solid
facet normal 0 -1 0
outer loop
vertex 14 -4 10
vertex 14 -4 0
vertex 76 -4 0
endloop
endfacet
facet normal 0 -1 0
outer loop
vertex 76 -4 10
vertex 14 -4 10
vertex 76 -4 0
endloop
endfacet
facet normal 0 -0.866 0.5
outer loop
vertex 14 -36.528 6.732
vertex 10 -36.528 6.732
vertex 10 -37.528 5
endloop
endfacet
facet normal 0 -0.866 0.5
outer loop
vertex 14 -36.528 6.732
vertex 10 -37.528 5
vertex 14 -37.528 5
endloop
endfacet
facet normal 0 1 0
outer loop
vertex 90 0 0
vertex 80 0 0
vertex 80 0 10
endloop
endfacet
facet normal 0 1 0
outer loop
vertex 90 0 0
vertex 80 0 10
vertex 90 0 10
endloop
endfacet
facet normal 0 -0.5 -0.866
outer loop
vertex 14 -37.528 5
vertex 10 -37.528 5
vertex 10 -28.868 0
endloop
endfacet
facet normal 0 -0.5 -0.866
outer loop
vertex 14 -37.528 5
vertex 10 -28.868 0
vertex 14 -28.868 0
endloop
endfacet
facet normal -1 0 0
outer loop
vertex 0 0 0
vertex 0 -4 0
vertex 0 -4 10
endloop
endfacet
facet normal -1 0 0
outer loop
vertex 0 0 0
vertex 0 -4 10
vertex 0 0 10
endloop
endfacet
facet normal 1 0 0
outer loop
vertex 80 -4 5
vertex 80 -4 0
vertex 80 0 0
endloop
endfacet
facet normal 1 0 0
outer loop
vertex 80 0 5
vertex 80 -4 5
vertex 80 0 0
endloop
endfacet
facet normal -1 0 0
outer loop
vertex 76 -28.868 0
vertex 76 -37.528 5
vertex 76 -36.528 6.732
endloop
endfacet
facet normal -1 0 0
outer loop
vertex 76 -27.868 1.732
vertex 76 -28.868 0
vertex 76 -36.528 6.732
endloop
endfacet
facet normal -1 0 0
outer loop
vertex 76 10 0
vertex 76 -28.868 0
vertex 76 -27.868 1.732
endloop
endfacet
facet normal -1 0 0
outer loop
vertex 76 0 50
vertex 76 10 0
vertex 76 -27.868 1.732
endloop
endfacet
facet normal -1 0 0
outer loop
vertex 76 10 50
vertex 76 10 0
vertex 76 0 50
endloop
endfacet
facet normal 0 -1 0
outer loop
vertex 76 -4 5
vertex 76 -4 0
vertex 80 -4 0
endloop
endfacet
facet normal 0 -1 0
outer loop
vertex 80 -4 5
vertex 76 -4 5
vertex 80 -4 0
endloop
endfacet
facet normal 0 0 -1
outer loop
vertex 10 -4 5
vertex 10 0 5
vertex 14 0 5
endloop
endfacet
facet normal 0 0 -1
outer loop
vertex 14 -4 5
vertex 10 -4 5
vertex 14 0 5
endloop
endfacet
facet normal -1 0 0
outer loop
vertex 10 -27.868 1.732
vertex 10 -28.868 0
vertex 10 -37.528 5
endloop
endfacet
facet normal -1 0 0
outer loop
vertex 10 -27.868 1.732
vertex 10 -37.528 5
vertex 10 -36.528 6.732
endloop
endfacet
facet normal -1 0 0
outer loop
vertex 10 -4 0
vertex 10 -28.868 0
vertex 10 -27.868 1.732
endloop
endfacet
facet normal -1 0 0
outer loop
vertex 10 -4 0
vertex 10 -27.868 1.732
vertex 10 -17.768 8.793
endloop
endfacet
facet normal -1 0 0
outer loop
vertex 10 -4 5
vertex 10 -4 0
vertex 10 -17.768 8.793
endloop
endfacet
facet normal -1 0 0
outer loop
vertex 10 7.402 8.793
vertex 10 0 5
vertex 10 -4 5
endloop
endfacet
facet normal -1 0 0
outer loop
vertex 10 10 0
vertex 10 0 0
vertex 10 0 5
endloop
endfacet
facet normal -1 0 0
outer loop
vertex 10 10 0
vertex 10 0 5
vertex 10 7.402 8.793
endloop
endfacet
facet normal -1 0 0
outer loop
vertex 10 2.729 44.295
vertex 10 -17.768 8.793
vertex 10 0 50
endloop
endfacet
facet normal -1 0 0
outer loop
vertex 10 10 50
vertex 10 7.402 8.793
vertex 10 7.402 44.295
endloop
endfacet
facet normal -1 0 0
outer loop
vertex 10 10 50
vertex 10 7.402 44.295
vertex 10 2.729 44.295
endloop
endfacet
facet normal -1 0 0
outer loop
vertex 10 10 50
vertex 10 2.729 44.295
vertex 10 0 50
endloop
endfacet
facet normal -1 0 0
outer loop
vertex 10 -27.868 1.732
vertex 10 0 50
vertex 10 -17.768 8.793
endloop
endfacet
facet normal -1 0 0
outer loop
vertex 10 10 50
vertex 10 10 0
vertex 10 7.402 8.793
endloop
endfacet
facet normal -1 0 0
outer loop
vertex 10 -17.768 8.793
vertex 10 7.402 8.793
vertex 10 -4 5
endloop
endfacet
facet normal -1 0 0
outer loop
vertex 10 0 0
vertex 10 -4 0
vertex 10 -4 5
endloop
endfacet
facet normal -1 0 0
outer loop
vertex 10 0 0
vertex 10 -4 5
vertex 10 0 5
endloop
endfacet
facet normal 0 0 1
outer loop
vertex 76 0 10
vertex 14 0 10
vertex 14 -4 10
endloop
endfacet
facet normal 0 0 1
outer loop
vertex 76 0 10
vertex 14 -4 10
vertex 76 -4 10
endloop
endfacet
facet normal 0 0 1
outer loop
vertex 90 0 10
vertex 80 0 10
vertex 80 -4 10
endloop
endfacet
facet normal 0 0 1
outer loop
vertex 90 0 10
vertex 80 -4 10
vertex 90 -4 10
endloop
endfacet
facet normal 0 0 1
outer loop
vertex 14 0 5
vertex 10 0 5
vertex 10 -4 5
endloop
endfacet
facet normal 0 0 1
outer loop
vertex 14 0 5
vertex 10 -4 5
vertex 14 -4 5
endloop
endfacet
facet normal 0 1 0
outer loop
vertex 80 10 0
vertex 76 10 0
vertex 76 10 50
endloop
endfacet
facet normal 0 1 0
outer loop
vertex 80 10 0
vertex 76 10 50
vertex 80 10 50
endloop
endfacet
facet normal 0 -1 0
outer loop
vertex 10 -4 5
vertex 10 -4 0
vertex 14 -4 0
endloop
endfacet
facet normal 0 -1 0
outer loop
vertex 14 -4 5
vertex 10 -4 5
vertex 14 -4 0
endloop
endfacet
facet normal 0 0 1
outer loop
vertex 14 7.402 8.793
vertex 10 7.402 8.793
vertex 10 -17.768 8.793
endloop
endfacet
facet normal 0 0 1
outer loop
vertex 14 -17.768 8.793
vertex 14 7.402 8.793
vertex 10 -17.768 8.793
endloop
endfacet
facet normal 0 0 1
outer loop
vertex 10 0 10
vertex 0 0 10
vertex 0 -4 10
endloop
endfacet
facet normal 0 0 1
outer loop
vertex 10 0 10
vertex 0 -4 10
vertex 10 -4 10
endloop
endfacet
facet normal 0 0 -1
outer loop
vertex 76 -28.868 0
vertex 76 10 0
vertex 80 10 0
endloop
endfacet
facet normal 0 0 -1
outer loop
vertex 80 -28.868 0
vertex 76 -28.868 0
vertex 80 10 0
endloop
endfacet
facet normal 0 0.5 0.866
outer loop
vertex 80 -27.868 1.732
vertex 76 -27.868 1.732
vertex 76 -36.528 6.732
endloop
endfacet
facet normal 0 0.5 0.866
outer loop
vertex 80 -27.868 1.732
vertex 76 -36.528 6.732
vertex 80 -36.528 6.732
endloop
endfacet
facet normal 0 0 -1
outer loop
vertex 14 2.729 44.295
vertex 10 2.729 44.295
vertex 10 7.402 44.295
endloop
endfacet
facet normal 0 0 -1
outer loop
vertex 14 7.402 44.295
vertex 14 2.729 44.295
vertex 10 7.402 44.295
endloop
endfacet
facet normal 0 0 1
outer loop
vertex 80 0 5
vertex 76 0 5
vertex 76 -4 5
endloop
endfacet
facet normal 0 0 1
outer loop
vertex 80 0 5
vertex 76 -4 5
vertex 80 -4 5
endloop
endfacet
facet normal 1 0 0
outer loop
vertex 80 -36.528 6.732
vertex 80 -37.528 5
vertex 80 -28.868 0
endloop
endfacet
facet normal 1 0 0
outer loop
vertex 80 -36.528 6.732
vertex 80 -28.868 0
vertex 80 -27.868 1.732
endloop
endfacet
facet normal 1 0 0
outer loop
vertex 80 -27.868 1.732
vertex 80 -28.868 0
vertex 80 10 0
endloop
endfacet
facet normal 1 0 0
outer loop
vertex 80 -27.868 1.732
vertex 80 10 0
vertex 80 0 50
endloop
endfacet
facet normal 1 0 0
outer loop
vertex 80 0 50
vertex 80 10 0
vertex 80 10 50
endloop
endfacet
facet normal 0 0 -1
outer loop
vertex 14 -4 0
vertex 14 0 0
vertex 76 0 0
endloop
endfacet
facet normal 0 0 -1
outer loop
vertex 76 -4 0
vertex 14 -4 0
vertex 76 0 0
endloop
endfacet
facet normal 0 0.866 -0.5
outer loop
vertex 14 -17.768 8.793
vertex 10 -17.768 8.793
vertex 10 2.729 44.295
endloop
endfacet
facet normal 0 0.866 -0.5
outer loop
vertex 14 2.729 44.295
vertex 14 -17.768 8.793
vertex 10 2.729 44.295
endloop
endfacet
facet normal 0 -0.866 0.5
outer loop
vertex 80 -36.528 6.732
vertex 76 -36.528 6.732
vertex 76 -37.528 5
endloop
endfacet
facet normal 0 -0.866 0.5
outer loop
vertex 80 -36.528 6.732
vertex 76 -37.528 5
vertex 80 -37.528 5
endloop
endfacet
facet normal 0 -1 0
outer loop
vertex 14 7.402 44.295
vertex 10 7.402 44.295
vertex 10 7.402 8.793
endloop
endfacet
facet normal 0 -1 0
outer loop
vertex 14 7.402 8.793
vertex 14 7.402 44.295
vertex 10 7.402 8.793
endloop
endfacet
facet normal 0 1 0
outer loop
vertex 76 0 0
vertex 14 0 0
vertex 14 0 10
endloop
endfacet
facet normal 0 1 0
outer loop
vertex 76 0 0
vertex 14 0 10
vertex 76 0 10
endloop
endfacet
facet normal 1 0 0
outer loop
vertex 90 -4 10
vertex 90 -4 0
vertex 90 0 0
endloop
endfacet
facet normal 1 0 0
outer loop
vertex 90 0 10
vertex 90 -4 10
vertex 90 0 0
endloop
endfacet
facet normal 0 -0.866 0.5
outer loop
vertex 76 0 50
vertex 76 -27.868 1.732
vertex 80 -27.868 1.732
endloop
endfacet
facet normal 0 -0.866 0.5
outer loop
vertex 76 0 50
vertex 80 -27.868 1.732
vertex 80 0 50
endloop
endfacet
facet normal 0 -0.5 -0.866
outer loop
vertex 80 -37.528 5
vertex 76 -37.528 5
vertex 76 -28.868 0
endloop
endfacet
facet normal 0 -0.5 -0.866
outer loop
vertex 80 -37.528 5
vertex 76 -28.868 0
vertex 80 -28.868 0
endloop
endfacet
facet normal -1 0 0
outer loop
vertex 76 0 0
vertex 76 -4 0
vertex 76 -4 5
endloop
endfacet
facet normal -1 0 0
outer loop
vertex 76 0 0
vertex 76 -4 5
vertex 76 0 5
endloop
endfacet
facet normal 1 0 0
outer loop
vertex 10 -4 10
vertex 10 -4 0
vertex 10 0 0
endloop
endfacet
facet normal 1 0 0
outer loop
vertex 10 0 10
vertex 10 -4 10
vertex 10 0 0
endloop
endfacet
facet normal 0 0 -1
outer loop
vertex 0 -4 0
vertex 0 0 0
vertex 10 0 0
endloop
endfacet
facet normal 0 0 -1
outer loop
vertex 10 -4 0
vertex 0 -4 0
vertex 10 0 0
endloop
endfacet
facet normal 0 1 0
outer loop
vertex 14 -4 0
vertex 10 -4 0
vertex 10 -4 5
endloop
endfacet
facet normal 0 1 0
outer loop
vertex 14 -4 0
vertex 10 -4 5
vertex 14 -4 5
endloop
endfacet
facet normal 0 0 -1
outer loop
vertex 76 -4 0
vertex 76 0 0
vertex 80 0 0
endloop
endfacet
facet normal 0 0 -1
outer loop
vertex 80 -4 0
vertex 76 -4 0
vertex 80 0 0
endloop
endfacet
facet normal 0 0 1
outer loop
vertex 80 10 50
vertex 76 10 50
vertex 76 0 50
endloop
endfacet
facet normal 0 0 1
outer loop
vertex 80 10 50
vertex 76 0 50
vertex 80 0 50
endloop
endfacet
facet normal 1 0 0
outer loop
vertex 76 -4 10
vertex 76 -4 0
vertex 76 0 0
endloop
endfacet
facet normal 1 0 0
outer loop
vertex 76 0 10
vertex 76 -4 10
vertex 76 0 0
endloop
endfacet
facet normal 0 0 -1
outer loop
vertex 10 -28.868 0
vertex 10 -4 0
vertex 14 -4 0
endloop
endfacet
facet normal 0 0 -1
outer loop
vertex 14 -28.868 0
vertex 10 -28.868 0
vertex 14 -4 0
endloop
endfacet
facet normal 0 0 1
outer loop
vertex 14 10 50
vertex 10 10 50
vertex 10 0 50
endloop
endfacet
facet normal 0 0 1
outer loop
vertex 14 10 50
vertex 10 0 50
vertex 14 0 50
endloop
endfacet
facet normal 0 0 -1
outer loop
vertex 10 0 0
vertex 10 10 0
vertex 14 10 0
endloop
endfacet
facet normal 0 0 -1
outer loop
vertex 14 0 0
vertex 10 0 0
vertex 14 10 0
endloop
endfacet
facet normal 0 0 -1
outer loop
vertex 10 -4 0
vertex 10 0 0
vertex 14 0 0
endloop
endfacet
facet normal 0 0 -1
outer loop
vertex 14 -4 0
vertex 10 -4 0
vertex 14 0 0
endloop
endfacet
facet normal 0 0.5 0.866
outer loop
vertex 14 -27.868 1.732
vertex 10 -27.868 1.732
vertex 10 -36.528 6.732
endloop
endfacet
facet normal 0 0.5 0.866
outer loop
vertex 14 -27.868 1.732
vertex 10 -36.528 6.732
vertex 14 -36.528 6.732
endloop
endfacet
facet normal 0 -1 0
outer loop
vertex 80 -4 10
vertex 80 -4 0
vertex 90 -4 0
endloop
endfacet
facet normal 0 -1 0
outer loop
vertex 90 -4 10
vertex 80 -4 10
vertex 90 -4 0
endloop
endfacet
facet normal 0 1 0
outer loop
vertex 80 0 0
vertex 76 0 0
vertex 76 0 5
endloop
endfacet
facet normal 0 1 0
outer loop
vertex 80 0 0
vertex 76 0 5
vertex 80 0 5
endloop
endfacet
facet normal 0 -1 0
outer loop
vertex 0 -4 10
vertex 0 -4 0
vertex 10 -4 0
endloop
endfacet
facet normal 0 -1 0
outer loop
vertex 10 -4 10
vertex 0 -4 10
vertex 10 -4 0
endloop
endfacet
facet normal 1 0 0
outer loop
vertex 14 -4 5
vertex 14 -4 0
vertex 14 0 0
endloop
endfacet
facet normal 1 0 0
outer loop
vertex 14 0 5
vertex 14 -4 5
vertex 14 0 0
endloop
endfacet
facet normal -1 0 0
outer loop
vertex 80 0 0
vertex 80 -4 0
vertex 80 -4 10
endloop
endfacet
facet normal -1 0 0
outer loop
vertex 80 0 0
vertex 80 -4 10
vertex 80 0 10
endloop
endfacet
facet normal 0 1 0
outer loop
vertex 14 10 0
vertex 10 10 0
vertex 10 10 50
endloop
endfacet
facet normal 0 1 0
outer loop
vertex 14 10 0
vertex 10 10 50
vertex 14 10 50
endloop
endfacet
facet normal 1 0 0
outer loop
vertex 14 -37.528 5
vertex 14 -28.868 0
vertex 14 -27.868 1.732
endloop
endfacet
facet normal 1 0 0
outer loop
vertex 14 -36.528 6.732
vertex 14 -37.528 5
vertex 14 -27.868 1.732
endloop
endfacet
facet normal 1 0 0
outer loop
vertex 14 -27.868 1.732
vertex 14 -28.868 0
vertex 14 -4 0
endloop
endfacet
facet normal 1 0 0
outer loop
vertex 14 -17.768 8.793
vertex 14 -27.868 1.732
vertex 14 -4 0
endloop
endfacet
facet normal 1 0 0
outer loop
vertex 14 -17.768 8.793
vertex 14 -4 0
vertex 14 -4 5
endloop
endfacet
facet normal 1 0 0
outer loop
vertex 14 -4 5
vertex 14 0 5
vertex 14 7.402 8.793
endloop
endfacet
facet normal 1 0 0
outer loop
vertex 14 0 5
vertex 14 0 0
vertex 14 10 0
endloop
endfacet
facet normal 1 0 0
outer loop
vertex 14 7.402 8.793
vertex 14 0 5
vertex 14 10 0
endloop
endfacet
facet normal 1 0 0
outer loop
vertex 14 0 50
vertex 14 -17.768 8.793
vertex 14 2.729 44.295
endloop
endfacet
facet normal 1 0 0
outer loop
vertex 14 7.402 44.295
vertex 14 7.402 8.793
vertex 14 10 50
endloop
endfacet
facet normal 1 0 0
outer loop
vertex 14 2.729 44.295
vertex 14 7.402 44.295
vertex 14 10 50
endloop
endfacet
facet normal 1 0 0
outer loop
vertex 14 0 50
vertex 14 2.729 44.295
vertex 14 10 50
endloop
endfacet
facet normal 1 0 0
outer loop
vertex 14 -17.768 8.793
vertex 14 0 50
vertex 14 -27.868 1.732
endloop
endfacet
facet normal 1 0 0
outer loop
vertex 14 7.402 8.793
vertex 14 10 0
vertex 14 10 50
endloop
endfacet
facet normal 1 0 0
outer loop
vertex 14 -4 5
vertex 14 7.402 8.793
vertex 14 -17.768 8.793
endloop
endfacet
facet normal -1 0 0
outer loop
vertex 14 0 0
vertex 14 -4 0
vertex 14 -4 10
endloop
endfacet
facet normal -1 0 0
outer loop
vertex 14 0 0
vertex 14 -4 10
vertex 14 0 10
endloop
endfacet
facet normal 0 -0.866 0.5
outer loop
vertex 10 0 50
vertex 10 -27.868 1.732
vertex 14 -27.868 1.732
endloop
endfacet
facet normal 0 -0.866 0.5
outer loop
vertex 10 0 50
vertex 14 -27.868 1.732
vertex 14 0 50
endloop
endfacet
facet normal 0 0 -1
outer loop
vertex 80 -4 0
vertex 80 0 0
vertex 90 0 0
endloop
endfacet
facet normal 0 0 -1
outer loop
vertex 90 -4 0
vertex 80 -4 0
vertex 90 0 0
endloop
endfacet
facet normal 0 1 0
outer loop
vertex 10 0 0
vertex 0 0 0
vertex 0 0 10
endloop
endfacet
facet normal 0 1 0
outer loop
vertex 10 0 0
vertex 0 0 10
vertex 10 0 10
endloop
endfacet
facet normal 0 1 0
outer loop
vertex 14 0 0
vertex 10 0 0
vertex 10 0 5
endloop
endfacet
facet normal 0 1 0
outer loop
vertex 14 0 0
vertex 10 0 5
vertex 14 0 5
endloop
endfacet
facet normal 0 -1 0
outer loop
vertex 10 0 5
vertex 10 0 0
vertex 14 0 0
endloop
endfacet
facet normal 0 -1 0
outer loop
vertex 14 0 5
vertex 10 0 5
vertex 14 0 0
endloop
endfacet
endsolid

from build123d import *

# Parameters (mm, degrees)
F0_W          = 10
F0_H          = 4
F1_DEPTH      = 10
F0_W_2        = 62
F0_W_3        = 4
F0_H_2        = 10
F0_H_3        = 46
F2_DEPTH      = 50
F3_T1_DEPTH   = 452.0963970585
F3_2_T1_DEPTH = 452.0963970585
F4_W          = 4
F4_H          = 2
F5_DEPTH      = 10
F6_W          = 4
F6_H          = 2
F7_DEPTH      = 10
F8_DEPTH      = 5
F9_DEPTH      = 5
F11_DEPTH     = 25


# Not quite as in the source:
# - a fillet or chamfer that OpenCascade refuses, or shapes differently, is made with other operations: its cross-section is extruded or revolved along the edge and cut away or added


with BuildPart() as f1:
    # F0 (on Top) → F1 (new body)
    with BuildSketch(Plane.XY):
        with Locations((5, -2)):
            Rectangle(F0_W, F0_H)
    extrude(amount=F1_DEPTH)


with BuildPart() as f1b:
    # F0 (on Top) → F1, piece 2 (new body)
    with BuildSketch(Plane.XY):
        with Locations((45, -2)):
            Rectangle(F0_W_2, F0_H)
    extrude(amount=F1_DEPTH)


with BuildPart() as f1c:
    # F0 (on Top) → F1, piece 3 (new body)
    with BuildSketch(Plane.XY):
        with Locations((85, -2)):
            Rectangle(F0_W, F0_H)
    extrude(amount=F1_DEPTH)


with BuildPart() as f2:
    # F0 (on Top) → F2 (new body)
    with BuildSketch(Plane.XY):
        with Locations((12, 5)):
            Rectangle(F0_W_3, F0_H_2)
        with Locations((12, -2)):
            Rectangle(F0_W_3, F0_H)
        with Locations((12, -27)):
            Rectangle(F0_W_3, F0_H_3)
    extrude(amount=F2_DEPTH)

    # F3: chamfer of 50 x 86.6025403784 on 1 edges, made by hand

    # F3_s2 → F3_t1 (cut)
    with BuildSketch(Plane.YZ.offset(-214.0481985292)):
        Polygon((-50, -36.6025403784), (0, 50), (-50, 50), align=None)
    extrude(amount=F3_T1_DEPTH, mode=Mode.SUBTRACT)

    # F4 (on face) → F5 (join)
    with BuildSketch(Plane(origin=(0, -21.6506350946, 12.5), x_dir=(1, 0, 0), z_dir=(0, -0.8660254038, 0.5))):
        with Locations((12, -13.4337567297)):
            Rectangle(F4_W, F4_H)
    extrude(amount=F5_DEPTH)

    # F0 (on Top) → F9 (cut)
    with BuildSketch(Plane.XY):
        with Locations((12, -2)):
            Rectangle(F0_W_3, F0_H)
    extrude(amount=F9_DEPTH, mode=Mode.SUBTRACT)

    # F10 (on face) → F11 (cut)
    with BuildSketch(Plane(origin=(10, 0, 0), x_dir=(0, -1, 0), z_dir=(-1, 0, 0))):
        Polygon((-7.4024386704, 44.2947206634), (-7.4024386704, 8.7926825508), (17.7682936192, 8.7926825508), (-2.7288176419, 44.2947206634), align=None)
    extrude(amount=-F11_DEPTH, mode=Mode.SUBTRACT)


with BuildPart() as f2b:
    # F0 (on Top) → F2, piece 2 (new body)
    with BuildSketch(Plane.XY):
        with Locations((78, 5)):
            Rectangle(F0_W_3, F0_H_2)
        with Locations((78, -2)):
            Rectangle(F0_W_3, F0_H)
        with Locations((78, -27)):
            Rectangle(F0_W_3, F0_H_3)
    extrude(amount=F2_DEPTH)

    # F3#2: chamfer of 50 x 86.6025403784 on 1 edges, made by hand

    # F3_2_s2 → F3_2_t1 (cut)
    with BuildSketch(Plane.YZ.offset(-148.0481985292)):
        Polygon((-50, -36.6025403784), (0, 50), (-50, 50), align=None)
    extrude(amount=F3_2_T1_DEPTH, mode=Mode.SUBTRACT)

    # F6 (on face) → F7 (join)
    with BuildSketch(Plane(origin=(0, -21.6506350946, 12.5), x_dir=(1, 0, 0), z_dir=(0, -0.8660254038, 0.5))):
        with Locations((78, -13.4337567297)):
            Rectangle(F6_W, F6_H)
    extrude(amount=F7_DEPTH)


with BuildPart() as f8:
    # F0 (on Top) → F8 (new body)
    with BuildSketch(Plane.XY):
        with Locations((12, -2)):
            Rectangle(F0_W_3, F0_H)
    extrude(amount=F8_DEPTH)


with BuildPart() as f8b:
    # F0 (on Top) → F8, piece 2 (new body)
    with BuildSketch(Plane.XY):
        with Locations((78, -2)):
            Rectangle(F0_W_3, F0_H)
    extrude(amount=F8_DEPTH)


solid = Compound([f1.part, f1b.part, f1c.part, f2.part, f2b.part, f8.part, f8b.part])
